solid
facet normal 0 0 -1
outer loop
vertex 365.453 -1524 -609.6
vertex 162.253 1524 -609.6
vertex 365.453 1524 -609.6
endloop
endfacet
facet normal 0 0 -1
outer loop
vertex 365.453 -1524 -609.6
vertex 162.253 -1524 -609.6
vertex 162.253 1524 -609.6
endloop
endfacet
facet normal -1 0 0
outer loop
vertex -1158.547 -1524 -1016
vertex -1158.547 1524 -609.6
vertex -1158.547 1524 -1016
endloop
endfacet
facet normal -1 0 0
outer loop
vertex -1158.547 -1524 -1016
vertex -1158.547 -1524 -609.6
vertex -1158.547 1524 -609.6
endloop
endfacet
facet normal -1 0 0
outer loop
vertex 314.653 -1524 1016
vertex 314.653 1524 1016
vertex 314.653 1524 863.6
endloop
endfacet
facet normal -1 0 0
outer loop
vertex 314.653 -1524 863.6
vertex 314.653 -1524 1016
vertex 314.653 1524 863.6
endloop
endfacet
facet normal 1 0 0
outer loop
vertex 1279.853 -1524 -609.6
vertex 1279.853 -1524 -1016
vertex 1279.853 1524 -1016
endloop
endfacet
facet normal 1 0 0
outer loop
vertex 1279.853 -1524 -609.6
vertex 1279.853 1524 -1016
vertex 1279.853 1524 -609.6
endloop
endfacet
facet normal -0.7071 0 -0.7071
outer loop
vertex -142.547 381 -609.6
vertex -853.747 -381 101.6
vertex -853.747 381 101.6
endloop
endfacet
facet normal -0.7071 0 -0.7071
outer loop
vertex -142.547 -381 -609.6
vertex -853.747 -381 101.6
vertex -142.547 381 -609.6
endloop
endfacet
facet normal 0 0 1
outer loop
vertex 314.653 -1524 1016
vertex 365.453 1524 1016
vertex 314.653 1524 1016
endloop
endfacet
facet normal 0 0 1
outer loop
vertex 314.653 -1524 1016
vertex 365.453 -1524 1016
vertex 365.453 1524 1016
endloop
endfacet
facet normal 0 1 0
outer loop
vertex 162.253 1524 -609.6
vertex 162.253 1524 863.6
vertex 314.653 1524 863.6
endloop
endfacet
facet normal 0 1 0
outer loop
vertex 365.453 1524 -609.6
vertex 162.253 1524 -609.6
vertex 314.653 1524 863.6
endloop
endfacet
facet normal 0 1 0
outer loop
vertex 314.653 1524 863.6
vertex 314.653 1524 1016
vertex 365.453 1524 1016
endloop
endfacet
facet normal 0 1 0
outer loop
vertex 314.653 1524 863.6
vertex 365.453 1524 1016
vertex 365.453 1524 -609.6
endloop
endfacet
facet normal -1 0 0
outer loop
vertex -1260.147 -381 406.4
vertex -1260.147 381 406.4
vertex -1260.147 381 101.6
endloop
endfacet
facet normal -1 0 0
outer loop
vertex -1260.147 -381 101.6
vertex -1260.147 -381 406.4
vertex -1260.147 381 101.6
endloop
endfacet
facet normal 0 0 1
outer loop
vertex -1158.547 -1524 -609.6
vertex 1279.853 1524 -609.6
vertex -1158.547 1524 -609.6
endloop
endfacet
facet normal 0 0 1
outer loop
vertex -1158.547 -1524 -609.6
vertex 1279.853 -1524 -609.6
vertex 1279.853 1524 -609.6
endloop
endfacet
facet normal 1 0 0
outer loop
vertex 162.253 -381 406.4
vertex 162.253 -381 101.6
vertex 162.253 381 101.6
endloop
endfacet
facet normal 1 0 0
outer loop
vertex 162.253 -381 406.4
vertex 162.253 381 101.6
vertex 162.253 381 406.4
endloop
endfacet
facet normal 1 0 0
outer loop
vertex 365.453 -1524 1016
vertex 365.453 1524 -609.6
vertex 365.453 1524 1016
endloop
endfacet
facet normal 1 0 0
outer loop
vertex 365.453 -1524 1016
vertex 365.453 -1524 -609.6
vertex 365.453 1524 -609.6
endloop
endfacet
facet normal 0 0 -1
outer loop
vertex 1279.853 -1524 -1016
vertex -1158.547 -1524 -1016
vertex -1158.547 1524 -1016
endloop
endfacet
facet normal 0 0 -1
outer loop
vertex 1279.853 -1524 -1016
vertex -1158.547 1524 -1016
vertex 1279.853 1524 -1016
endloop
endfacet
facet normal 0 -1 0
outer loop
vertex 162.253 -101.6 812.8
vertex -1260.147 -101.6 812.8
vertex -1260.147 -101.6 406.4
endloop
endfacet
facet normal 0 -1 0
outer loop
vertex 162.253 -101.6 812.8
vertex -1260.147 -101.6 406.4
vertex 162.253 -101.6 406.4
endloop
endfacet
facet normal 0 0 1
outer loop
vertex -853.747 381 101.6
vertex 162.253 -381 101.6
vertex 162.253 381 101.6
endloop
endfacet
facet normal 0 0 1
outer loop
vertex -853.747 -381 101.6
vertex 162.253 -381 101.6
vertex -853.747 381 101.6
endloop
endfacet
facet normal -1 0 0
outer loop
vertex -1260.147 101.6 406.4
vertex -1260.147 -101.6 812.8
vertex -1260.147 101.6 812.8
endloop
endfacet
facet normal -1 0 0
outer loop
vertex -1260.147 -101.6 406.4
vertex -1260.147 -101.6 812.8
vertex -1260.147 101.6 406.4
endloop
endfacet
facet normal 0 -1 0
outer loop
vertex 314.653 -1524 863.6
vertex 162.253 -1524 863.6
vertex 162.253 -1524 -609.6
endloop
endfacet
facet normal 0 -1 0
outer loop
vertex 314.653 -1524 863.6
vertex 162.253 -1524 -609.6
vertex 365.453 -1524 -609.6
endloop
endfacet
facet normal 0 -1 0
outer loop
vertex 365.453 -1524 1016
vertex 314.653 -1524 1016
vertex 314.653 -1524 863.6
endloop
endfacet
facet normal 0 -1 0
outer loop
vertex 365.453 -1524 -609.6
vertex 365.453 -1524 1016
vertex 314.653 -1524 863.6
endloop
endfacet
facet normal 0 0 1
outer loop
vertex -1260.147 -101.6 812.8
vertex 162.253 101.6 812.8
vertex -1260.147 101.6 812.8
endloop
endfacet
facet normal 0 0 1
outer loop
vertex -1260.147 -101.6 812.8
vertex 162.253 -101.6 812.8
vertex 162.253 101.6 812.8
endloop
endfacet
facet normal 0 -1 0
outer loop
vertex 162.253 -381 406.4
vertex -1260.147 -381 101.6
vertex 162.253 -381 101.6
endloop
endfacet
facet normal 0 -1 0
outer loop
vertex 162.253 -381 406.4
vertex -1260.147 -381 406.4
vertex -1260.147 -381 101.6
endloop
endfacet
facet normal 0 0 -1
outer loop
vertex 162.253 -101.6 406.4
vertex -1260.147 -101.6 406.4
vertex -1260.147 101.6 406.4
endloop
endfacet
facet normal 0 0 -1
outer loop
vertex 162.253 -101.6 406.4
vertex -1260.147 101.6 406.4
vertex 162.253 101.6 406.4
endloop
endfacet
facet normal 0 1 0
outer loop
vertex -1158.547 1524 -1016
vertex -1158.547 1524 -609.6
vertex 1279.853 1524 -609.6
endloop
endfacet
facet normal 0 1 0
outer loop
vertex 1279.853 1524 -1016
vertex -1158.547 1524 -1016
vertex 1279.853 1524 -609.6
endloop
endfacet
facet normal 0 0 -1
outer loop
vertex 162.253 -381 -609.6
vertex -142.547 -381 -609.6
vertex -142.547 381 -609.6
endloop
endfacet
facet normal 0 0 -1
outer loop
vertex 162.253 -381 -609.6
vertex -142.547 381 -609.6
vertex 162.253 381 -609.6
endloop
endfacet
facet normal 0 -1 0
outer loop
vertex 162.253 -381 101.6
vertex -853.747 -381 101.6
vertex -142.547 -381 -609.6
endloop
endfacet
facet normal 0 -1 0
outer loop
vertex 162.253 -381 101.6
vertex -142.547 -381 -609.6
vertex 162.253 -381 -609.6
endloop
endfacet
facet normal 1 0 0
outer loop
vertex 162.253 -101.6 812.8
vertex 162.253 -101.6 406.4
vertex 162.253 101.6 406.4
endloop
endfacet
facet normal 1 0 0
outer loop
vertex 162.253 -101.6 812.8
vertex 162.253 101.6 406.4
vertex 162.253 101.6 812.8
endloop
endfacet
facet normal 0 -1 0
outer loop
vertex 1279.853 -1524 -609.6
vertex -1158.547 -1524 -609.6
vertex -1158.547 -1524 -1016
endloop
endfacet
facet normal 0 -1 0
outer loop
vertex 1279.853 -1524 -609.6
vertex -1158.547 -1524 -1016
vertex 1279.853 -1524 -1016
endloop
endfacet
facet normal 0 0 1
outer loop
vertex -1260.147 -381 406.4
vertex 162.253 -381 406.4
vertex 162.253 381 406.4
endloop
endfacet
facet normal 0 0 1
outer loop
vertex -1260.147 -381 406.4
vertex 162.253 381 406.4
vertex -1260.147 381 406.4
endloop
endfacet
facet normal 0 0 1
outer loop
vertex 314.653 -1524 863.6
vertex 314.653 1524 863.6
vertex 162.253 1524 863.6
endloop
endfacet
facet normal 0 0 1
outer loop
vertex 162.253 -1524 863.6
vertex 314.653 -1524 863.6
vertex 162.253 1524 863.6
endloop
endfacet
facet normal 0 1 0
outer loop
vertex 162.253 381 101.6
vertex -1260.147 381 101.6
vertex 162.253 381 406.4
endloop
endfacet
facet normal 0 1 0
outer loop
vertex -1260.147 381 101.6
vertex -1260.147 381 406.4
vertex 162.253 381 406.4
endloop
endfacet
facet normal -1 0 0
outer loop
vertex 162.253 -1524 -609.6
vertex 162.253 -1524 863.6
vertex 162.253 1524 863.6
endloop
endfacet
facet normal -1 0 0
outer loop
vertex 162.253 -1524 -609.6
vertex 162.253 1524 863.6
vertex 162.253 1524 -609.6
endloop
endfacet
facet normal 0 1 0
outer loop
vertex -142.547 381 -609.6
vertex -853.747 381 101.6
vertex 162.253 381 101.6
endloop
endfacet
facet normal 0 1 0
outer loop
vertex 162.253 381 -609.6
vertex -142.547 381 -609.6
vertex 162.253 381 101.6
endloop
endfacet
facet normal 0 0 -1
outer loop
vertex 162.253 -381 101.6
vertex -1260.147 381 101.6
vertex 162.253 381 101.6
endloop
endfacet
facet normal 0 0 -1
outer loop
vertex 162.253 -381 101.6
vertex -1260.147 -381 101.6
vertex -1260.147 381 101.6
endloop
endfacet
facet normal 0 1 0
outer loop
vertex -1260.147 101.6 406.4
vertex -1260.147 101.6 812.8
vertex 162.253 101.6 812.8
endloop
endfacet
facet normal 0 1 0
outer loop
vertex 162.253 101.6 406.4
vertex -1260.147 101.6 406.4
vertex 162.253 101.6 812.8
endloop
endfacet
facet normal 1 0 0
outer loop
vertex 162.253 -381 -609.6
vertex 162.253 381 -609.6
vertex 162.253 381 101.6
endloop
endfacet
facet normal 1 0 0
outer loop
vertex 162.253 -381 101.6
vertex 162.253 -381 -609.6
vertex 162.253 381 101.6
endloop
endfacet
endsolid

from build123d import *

# Parameters (mm, degrees)
F1_DEPTH = 381
F0_W     = 203.2
F0_H     = 203.2
F2_DEPTH = 101.6
F4_DEPTH = 762
F0_H_2   = 406.4
F5_DEPTH = 1524
F6_DEPTH = 1524


with BuildPart() as f1:
    # F0 (on Front) → F1 (new body, symmetric)
    with BuildSketch(Plane.XZ):
        Polygon((-1260.146816, 101.6), (162.253184, 101.6), (162.253184, 203.2), (162.253184, 406.4), (-40.946816, 406.4), (-447.346816, 406.4), (-853.746816, 406.4), (-1260.146816, 406.4), align=None)
    extrude(amount=F1_DEPTH, both=True)


with BuildPart() as f2:
    # F0 (on Front) → F2 (new body, symmetric)
    with BuildSketch(Plane.XZ):
        with Locations((-1158.546816, 711.2)):
            Rectangle(F0_W, F0_H)
        with Locations((60.653184, 508)):
            Rectangle(F0_W, F0_H)
        Polygon((-447.346816, 406.4), (-40.946816, 406.4), (-40.946816, 609.6), (-244.146816, 609.6), (-447.346816, 609.6), align=None)
        Polygon((-853.746816, 609.6), (-853.746816, 406.4), (-447.346816, 406.4), (-447.346816, 609.6), (-650.546816, 609.6), align=None)
        Polygon((-1260.146816, 609.6), (-1260.146816, 406.4), (-853.746816, 406.4), (-853.746816, 609.6), (-1056.946816, 609.6), align=None)
        Polygon((-1056.946816, 609.6), (-853.746816, 609.6), (-650.546816, 609.6), (-650.546816, 812.8), (-1056.946816, 812.8), align=None)
        Polygon((-244.146816, 609.6), (-244.146816, 812.8), (-650.546816, 812.8), (-650.546816, 609.6), (-447.346816, 609.6), align=None)
        Polygon((-40.946816, 609.6), (162.253184, 609.6), (162.253184, 812.8), (-244.146816, 812.8), (-244.146816, 609.6), align=None)
    extrude(amount=F2_DEPTH, both=True)


with BuildPart() as f4:
    # F3 (on face) → F4 (new body)
    with BuildSketch(Plane.XZ.offset(381)):
        Polygon((162.253184, -609.6), (162.253184, 101.6), (-853.746816, 101.6), (-142.546816, -609.6), align=None)
    extrude(amount=-F4_DEPTH)


with BuildPart() as f5:
    # F0 (on Front) → F5 (new body, symmetric)
    with BuildSketch(Plane.XZ):
        Polygon((162.253184, 812.8), (365.453184, 812.8), (365.453184, 1016), (314.653184, 1016), (314.653184, 863.6), (162.253184, 863.6), align=None)
        with Locations((263.853184, 711.2)):
            Rectangle(F0_W, F0_H)
        with Locations((263.853184, 508)):
            Rectangle(F0_W, F0_H)
        with Locations((263.853184, 304.8)):
            Rectangle(F0_W, F0_H)
        Polygon((162.253184, 101.6), (162.253184, 0), (365.453184, 0), (365.453184, 203.2), (162.253184, 203.2), align=None)
        with Locations((263.853184, -101.6)):
            Rectangle(F0_W, F0_H)
        with Locations((263.853184, -406.4)):
            Rectangle(F0_W, F0_H_2)
    extrude(amount=F5_DEPTH, both=True)


with BuildPart() as f6:
    # F0 (on Front) → F6 (new body, symmetric)
    with BuildSketch(Plane.XZ):
        Polygon((162.253184, -609.6), (-1158.546816, -609.6), (-1158.546816, -1016), (1279.853184, -1016), (1279.853184, -609.6), (365.453184, -609.6), align=None)
    extrude(amount=F6_DEPTH, both=True)


solid = Compound([f1.part, f2.part, f4.part, f5.part, f6.part])
